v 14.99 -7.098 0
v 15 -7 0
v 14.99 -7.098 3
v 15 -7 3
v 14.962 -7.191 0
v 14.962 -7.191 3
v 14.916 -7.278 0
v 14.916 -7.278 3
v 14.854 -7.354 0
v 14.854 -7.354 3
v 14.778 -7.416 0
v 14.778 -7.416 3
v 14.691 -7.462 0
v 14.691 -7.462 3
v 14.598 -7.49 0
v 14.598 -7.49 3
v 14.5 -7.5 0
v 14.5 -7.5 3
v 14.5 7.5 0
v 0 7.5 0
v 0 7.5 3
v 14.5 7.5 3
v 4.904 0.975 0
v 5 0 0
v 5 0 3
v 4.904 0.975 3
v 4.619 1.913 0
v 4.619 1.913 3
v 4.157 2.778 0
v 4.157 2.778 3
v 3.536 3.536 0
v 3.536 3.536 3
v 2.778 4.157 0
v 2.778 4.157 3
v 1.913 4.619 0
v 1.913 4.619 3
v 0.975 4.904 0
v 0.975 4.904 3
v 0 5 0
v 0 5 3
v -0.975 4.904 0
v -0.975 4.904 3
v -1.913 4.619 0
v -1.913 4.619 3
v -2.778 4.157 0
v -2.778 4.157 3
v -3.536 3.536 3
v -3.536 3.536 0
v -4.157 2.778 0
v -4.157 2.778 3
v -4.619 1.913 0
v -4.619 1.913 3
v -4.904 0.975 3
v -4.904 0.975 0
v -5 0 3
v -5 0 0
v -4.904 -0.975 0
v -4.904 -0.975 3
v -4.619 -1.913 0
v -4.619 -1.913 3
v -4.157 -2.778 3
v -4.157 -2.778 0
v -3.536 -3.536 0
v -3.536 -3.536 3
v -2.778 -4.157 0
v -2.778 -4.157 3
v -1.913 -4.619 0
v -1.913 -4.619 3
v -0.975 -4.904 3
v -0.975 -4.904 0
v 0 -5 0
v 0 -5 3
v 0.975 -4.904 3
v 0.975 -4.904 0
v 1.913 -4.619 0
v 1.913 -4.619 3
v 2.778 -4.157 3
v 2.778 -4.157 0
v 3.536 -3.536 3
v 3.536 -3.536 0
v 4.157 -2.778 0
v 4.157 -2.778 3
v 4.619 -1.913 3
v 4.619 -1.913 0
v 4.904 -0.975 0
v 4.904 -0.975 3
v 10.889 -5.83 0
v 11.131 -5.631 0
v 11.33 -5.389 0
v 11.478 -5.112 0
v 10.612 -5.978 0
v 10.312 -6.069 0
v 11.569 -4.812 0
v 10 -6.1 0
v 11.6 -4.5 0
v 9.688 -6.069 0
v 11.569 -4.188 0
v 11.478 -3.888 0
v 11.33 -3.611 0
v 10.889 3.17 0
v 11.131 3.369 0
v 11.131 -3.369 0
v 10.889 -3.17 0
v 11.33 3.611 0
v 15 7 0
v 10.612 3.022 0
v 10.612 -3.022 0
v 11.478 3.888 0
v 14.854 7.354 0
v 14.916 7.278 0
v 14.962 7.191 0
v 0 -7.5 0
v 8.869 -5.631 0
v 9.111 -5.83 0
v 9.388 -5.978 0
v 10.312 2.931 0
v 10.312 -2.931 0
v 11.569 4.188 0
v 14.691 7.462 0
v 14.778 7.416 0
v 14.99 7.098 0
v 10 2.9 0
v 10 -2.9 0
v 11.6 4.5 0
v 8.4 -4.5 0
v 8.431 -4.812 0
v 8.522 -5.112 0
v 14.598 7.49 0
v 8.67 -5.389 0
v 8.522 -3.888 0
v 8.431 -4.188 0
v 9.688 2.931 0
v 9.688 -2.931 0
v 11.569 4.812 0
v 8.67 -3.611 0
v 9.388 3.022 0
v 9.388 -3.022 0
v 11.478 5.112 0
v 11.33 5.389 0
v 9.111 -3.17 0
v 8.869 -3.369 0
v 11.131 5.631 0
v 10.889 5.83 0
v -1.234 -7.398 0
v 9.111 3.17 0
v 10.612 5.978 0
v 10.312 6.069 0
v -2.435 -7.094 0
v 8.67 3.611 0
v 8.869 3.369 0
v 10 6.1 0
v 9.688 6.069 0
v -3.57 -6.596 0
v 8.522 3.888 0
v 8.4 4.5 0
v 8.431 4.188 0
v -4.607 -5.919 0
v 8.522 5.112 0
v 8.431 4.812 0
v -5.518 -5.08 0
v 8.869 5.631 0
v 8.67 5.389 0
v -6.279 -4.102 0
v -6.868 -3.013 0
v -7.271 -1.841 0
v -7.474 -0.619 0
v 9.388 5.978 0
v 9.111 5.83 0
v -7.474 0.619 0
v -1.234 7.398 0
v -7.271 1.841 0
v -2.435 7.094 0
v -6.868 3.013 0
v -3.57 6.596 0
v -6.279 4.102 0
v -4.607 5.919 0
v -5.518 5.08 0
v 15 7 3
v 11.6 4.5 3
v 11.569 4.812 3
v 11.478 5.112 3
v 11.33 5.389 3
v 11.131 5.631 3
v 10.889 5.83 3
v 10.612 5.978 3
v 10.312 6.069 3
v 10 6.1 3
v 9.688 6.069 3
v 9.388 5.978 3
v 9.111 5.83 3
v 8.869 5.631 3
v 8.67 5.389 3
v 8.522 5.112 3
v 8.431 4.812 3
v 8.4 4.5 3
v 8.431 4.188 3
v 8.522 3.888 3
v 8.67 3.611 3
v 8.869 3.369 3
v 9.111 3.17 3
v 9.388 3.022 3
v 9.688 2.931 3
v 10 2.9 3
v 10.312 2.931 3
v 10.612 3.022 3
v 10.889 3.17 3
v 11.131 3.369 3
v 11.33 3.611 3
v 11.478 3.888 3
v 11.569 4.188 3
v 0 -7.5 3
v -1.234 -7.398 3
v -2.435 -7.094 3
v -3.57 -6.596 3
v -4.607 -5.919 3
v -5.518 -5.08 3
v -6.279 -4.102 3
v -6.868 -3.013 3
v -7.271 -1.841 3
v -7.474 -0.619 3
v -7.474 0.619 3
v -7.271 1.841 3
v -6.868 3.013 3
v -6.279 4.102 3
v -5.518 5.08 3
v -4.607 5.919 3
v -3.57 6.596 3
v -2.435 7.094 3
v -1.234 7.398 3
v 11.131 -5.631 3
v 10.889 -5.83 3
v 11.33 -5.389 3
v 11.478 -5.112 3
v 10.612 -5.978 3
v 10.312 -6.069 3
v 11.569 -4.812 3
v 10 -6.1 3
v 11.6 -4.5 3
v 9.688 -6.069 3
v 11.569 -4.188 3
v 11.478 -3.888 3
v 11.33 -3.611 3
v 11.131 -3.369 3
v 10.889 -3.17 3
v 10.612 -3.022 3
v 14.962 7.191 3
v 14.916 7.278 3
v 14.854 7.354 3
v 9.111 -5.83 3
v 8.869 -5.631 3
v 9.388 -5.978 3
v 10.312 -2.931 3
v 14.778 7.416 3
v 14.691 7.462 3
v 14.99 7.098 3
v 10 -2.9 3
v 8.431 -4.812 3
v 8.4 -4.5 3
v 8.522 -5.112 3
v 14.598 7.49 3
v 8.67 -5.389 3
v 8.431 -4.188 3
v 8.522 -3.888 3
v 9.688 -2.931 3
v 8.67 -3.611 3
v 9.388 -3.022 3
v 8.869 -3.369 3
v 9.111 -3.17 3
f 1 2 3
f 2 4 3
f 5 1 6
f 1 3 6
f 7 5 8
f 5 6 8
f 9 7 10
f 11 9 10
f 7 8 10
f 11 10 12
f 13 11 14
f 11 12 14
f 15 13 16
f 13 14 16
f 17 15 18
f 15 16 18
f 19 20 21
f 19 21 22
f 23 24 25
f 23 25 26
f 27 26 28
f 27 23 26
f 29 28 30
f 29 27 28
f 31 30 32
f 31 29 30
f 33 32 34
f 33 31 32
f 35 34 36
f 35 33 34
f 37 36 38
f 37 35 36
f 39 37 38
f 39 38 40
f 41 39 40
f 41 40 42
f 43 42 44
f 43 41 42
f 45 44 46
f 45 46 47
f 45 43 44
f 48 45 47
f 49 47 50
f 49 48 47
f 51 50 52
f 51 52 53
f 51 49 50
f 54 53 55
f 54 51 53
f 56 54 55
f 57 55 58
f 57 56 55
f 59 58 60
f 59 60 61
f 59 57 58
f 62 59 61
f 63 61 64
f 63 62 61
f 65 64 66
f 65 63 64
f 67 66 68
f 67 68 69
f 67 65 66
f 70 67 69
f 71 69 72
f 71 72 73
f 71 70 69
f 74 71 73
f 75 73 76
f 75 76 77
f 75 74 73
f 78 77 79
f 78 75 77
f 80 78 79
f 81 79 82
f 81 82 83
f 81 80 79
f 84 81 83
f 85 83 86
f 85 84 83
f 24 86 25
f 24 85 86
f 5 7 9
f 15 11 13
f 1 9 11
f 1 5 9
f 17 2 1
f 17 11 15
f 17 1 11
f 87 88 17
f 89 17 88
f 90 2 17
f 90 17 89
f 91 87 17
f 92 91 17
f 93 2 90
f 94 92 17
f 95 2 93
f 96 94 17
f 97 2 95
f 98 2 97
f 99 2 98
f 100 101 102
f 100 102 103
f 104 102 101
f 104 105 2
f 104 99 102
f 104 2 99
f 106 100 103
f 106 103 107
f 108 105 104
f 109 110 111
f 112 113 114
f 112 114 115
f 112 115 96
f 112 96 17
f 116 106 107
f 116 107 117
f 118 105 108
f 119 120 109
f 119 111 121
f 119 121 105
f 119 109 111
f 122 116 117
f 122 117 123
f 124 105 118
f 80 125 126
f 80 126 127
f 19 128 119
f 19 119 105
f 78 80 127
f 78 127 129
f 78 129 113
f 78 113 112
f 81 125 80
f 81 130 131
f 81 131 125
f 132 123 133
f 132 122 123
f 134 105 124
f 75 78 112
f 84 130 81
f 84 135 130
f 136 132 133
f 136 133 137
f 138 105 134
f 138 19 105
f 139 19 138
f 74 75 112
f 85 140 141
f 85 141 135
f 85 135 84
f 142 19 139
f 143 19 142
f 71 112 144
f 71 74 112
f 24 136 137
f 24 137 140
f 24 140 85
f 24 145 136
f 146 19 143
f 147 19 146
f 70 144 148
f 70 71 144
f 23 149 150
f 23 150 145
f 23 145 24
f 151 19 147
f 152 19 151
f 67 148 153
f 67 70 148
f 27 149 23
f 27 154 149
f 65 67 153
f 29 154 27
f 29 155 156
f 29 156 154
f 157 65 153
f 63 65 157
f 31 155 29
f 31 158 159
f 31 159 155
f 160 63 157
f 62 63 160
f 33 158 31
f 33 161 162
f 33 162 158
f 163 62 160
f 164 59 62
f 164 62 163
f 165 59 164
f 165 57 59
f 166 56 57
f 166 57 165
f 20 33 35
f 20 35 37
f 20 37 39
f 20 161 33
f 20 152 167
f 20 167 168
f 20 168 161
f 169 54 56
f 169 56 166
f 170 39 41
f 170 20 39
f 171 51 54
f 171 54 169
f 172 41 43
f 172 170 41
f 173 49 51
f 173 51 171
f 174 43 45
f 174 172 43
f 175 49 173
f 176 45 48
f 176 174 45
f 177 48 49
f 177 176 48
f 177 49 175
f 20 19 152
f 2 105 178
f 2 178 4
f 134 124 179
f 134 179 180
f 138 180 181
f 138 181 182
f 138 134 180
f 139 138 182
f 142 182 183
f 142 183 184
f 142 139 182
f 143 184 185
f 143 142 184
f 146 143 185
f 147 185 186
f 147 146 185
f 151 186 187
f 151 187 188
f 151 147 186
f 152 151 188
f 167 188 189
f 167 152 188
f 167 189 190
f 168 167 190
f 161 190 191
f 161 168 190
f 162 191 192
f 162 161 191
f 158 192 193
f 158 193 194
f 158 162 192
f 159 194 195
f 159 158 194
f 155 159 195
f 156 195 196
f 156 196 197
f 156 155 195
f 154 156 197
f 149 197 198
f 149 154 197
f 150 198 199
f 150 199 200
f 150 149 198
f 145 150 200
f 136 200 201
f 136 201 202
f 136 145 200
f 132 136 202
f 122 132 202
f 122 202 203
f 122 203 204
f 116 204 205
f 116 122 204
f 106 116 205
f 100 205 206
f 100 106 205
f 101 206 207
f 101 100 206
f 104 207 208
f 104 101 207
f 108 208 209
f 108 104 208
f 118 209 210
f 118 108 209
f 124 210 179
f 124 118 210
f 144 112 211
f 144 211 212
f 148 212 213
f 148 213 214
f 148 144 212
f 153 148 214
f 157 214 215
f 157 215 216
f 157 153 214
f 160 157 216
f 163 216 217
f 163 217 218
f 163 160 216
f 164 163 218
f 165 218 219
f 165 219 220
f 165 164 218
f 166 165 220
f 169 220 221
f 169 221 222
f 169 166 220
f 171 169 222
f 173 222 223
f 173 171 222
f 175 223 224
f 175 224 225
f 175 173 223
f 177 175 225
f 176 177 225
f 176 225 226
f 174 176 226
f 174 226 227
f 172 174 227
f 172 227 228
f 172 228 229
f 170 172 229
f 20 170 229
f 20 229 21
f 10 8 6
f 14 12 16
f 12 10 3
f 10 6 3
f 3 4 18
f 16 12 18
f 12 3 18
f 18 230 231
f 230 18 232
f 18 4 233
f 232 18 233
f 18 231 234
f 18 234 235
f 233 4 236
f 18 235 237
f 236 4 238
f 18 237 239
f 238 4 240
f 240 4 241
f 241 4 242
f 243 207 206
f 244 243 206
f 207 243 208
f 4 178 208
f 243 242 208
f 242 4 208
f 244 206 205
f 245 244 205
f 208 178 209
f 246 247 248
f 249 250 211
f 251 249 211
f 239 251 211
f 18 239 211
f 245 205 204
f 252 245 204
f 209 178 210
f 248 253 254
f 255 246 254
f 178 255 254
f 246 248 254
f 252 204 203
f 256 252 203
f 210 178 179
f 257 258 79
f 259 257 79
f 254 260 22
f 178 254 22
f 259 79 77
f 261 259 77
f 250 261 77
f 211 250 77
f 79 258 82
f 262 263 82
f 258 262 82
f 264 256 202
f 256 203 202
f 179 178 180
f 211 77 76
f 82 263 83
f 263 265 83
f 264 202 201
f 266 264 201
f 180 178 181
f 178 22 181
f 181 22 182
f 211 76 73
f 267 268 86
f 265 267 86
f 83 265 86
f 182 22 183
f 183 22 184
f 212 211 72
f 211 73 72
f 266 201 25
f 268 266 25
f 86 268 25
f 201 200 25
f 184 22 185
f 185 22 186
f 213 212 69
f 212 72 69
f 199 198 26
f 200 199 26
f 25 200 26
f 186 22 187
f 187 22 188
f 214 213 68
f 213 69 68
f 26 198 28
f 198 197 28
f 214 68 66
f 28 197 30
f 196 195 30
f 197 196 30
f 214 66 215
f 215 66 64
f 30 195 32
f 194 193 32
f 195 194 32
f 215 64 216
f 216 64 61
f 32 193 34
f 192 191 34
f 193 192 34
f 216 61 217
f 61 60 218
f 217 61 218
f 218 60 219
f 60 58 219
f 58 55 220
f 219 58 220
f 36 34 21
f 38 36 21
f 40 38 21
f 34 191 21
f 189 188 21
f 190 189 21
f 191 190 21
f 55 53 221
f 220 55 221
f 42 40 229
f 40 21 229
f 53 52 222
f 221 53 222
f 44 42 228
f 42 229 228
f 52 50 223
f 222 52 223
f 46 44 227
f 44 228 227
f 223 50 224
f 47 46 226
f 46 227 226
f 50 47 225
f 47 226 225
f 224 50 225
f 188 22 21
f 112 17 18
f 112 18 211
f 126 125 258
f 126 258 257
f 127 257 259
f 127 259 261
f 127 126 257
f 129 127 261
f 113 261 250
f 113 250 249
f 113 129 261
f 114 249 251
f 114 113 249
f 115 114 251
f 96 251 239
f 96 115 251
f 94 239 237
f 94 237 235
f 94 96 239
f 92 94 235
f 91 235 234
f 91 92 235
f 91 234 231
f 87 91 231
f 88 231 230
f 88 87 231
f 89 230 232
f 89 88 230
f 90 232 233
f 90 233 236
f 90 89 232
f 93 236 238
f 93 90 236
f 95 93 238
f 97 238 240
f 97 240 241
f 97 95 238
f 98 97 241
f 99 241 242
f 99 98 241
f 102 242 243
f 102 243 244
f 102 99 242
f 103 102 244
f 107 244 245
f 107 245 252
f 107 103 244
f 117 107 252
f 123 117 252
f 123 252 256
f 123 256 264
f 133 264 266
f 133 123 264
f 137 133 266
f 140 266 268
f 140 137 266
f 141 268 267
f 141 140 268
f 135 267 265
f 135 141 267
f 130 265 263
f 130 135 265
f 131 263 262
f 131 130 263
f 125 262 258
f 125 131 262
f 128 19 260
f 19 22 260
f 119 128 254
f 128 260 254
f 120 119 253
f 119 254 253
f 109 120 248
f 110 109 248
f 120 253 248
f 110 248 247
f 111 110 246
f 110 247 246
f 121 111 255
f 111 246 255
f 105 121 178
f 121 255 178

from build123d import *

# Parameters (mm, degrees)
SKETCH_1_R      = 5
SKETCH_1_R_2    = 1.6
EXTRUDE_1_DEPTH = 3
FILLET_1_R      = 0.5


with BuildPart() as part:
    # ｽｹｯﾁ1 → ﾎﾞｽ - 押し出し1 (new body)
    with BuildSketch(Plane.XY):
        with BuildLine():
            Line((0, 7.5), (15, 7.5))
            Line((15, 7.5), (15, -7.5))
            Line((15, -7.5), (0, -7.5))
            ThreePointArc((0, -7.5), (-7.5, 0), (0, 7.5))
        make_face()
        Circle(SKETCH_1_R, mode=Mode.SUBTRACT)
        with Locations((10, 4.5)):
            Circle(SKETCH_1_R_2, mode=Mode.SUBTRACT)
        with Locations(Location((10, -4.5, 0), (0, 0, 180))):
            Circle(SKETCH_1_R_2, mode=Mode.SUBTRACT)
    extrude(amount=EXTRUDE_1_DEPTH)

    # ﾌｨﾚｯﾄ1
    fillet_1_edges = [part.edges().sort_by_distance(p)[0] for p in [
        (15, 7.5, 1.5),
        (15, -7.5, 1.5),
    ]]
    fillet(fillet_1_edges, radius=FILLET_1_R)


solid = part.part
